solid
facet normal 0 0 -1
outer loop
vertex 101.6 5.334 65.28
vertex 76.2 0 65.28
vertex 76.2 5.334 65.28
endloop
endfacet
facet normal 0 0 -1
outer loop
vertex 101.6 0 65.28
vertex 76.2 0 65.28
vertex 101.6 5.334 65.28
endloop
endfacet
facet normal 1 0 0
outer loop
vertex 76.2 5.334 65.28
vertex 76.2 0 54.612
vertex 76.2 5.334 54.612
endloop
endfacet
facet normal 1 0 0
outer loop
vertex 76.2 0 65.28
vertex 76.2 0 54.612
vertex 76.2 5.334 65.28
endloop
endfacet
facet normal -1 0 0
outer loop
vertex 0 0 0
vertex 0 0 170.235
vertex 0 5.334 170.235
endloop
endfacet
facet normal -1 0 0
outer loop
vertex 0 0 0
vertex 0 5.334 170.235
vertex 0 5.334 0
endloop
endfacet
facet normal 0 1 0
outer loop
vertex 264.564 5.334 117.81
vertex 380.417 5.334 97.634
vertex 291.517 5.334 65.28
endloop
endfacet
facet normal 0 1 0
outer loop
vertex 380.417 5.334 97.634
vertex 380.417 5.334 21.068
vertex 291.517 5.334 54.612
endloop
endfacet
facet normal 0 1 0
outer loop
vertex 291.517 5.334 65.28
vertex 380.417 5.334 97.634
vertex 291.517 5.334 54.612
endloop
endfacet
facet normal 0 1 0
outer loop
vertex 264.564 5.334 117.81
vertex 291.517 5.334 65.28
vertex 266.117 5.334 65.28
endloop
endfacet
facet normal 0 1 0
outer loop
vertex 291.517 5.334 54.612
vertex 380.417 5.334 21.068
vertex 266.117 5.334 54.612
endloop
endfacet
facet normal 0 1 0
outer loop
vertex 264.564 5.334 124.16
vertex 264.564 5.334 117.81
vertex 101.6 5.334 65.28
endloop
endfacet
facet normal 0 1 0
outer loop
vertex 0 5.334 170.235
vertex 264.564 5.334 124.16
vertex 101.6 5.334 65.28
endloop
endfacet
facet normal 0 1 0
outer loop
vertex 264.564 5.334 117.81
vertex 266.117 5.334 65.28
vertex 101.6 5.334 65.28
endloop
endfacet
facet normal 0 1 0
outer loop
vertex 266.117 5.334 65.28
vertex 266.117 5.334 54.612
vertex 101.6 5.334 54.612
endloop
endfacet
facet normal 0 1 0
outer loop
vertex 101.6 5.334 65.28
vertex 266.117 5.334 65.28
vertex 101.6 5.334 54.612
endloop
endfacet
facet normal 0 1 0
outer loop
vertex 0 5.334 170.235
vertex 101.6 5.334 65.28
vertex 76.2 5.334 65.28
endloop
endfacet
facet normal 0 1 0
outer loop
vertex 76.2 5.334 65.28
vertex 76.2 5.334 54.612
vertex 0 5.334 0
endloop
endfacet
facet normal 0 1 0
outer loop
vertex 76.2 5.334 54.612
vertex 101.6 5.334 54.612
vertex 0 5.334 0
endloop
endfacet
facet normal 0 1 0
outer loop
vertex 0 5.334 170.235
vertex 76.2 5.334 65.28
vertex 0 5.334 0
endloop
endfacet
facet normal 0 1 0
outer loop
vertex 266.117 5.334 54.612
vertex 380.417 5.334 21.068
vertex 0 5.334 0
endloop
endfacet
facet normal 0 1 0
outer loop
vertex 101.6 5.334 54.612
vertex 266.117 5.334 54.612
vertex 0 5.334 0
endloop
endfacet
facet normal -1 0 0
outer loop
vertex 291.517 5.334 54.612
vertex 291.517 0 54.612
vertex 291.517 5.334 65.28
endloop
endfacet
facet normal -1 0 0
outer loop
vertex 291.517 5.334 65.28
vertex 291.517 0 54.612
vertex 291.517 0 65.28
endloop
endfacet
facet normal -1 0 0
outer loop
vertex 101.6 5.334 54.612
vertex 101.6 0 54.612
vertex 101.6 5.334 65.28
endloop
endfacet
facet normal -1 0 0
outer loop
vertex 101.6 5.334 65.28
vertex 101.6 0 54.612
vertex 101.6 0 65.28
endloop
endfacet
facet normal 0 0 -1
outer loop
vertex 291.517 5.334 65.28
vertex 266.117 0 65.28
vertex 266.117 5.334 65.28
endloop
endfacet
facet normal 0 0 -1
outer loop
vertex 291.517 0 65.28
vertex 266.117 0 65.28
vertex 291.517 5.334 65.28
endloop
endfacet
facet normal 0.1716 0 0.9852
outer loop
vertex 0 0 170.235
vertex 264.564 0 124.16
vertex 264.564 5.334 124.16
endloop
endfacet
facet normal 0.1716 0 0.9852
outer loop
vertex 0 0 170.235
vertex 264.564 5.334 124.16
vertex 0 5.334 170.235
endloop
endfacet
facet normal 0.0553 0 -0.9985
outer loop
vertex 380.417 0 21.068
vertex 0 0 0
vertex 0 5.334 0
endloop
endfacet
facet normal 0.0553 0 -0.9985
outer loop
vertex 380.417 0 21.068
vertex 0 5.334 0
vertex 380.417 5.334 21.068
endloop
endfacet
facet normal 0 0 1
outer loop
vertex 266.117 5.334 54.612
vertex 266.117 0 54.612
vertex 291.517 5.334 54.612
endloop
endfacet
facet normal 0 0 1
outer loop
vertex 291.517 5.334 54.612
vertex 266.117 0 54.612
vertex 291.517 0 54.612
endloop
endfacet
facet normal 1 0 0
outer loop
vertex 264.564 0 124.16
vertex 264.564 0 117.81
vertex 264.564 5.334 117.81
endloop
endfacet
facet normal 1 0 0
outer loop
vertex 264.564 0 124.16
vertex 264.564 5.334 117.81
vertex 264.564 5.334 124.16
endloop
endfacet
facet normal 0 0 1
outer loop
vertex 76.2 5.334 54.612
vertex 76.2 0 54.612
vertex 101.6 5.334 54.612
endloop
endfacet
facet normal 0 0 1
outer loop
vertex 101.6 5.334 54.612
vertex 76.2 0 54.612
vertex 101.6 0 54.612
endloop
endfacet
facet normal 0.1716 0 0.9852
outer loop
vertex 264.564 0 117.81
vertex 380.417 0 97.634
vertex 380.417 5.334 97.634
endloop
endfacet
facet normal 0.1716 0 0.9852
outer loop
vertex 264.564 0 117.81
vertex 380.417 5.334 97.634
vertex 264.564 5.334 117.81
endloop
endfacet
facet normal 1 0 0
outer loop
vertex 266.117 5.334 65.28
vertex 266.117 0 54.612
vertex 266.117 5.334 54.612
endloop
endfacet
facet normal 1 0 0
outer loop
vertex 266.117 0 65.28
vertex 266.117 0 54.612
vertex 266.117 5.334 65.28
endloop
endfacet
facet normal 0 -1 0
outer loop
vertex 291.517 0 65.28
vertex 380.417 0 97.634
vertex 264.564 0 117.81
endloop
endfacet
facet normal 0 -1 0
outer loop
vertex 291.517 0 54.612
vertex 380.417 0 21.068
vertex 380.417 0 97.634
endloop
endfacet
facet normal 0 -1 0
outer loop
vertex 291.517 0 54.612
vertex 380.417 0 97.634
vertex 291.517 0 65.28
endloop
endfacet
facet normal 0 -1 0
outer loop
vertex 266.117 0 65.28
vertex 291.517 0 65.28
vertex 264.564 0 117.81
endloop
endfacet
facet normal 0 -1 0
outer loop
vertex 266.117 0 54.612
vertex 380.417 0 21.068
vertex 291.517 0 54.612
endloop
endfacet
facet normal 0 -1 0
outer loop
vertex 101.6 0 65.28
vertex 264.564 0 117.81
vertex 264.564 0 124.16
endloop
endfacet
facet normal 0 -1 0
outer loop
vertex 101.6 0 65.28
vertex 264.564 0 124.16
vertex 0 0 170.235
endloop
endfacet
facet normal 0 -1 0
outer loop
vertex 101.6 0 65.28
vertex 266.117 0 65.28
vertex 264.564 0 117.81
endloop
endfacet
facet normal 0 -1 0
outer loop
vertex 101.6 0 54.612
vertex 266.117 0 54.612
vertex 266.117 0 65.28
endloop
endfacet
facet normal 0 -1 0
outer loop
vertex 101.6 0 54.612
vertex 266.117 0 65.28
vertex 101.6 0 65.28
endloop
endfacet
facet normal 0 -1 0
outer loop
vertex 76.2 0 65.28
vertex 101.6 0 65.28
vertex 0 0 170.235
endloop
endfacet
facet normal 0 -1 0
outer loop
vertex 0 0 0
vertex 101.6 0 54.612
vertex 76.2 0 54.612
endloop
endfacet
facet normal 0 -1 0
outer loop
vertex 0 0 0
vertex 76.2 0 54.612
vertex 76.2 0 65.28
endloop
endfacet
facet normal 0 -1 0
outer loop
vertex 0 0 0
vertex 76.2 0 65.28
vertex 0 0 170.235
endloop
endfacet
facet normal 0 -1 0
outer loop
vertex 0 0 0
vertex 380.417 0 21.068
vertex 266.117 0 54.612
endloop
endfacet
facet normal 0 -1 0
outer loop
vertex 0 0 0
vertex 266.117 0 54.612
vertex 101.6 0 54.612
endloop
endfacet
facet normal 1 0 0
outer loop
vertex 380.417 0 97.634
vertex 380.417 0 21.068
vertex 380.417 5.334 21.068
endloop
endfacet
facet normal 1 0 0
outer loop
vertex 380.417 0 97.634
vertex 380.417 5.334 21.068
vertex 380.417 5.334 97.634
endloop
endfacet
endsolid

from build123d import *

# Parameters (mm, degrees)
BASE_DEPTH         = 5.334
CUT_EXTRUDE1_REACH = 7.334
SKETCH3_W          = 25.4
SKETCH3_H          = 10.668


with BuildPart() as part:
    # Sketch1 → Base (new body)
    with BuildSketch(Plane(origin=(0, 0, 0), x_dir=(1, 0, 0), z_dir=(0, 1, 0))):
        Polygon((0, 0), (380.417035208, -21.068443786), (380.417035208, -97.633742074), (264.564463463, -117.810081629), (264.564463463, -124.160081629), (0, -170.235385513), align=None)
    extrude(amount=BASE_DEPTH)

    # Sketch3 → Cut-Extrude1 (cut, up to next)
    with BuildSketch(Plane.XZ, mode=Mode.PRIVATE) as cut_extrude1_sk1:
        with Locations((278.817035208, 59.945526857)):
            Rectangle(SKETCH3_W, SKETCH3_H)
    cut_extrude1_tool1 = extrude(cut_extrude1_sk1.sketch, amount=-CUT_EXTRUDE1_REACH, mode=Mode.PRIVATE) & part.part
    add(cut_extrude1_tool1.solids().sort_by_distance((278.817035, 0, 59.945527))[0], mode=Mode.SUBTRACT)
    # Sketch3 → Cut-Extrude1 (cut, up to next)
    with BuildSketch(Plane.XZ, mode=Mode.PRIVATE) as cut_extrude1_sk2:
        with Locations((88.9, 59.945526857)):
            Rectangle(SKETCH3_W, SKETCH3_H)
    cut_extrude1_tool2 = extrude(cut_extrude1_sk2.sketch, amount=-CUT_EXTRUDE1_REACH, mode=Mode.PRIVATE) & part.part
    add(cut_extrude1_tool2.solids().sort_by_distance((88.9, 0, 59.945527))[0], mode=Mode.SUBTRACT)


solid = part.part
